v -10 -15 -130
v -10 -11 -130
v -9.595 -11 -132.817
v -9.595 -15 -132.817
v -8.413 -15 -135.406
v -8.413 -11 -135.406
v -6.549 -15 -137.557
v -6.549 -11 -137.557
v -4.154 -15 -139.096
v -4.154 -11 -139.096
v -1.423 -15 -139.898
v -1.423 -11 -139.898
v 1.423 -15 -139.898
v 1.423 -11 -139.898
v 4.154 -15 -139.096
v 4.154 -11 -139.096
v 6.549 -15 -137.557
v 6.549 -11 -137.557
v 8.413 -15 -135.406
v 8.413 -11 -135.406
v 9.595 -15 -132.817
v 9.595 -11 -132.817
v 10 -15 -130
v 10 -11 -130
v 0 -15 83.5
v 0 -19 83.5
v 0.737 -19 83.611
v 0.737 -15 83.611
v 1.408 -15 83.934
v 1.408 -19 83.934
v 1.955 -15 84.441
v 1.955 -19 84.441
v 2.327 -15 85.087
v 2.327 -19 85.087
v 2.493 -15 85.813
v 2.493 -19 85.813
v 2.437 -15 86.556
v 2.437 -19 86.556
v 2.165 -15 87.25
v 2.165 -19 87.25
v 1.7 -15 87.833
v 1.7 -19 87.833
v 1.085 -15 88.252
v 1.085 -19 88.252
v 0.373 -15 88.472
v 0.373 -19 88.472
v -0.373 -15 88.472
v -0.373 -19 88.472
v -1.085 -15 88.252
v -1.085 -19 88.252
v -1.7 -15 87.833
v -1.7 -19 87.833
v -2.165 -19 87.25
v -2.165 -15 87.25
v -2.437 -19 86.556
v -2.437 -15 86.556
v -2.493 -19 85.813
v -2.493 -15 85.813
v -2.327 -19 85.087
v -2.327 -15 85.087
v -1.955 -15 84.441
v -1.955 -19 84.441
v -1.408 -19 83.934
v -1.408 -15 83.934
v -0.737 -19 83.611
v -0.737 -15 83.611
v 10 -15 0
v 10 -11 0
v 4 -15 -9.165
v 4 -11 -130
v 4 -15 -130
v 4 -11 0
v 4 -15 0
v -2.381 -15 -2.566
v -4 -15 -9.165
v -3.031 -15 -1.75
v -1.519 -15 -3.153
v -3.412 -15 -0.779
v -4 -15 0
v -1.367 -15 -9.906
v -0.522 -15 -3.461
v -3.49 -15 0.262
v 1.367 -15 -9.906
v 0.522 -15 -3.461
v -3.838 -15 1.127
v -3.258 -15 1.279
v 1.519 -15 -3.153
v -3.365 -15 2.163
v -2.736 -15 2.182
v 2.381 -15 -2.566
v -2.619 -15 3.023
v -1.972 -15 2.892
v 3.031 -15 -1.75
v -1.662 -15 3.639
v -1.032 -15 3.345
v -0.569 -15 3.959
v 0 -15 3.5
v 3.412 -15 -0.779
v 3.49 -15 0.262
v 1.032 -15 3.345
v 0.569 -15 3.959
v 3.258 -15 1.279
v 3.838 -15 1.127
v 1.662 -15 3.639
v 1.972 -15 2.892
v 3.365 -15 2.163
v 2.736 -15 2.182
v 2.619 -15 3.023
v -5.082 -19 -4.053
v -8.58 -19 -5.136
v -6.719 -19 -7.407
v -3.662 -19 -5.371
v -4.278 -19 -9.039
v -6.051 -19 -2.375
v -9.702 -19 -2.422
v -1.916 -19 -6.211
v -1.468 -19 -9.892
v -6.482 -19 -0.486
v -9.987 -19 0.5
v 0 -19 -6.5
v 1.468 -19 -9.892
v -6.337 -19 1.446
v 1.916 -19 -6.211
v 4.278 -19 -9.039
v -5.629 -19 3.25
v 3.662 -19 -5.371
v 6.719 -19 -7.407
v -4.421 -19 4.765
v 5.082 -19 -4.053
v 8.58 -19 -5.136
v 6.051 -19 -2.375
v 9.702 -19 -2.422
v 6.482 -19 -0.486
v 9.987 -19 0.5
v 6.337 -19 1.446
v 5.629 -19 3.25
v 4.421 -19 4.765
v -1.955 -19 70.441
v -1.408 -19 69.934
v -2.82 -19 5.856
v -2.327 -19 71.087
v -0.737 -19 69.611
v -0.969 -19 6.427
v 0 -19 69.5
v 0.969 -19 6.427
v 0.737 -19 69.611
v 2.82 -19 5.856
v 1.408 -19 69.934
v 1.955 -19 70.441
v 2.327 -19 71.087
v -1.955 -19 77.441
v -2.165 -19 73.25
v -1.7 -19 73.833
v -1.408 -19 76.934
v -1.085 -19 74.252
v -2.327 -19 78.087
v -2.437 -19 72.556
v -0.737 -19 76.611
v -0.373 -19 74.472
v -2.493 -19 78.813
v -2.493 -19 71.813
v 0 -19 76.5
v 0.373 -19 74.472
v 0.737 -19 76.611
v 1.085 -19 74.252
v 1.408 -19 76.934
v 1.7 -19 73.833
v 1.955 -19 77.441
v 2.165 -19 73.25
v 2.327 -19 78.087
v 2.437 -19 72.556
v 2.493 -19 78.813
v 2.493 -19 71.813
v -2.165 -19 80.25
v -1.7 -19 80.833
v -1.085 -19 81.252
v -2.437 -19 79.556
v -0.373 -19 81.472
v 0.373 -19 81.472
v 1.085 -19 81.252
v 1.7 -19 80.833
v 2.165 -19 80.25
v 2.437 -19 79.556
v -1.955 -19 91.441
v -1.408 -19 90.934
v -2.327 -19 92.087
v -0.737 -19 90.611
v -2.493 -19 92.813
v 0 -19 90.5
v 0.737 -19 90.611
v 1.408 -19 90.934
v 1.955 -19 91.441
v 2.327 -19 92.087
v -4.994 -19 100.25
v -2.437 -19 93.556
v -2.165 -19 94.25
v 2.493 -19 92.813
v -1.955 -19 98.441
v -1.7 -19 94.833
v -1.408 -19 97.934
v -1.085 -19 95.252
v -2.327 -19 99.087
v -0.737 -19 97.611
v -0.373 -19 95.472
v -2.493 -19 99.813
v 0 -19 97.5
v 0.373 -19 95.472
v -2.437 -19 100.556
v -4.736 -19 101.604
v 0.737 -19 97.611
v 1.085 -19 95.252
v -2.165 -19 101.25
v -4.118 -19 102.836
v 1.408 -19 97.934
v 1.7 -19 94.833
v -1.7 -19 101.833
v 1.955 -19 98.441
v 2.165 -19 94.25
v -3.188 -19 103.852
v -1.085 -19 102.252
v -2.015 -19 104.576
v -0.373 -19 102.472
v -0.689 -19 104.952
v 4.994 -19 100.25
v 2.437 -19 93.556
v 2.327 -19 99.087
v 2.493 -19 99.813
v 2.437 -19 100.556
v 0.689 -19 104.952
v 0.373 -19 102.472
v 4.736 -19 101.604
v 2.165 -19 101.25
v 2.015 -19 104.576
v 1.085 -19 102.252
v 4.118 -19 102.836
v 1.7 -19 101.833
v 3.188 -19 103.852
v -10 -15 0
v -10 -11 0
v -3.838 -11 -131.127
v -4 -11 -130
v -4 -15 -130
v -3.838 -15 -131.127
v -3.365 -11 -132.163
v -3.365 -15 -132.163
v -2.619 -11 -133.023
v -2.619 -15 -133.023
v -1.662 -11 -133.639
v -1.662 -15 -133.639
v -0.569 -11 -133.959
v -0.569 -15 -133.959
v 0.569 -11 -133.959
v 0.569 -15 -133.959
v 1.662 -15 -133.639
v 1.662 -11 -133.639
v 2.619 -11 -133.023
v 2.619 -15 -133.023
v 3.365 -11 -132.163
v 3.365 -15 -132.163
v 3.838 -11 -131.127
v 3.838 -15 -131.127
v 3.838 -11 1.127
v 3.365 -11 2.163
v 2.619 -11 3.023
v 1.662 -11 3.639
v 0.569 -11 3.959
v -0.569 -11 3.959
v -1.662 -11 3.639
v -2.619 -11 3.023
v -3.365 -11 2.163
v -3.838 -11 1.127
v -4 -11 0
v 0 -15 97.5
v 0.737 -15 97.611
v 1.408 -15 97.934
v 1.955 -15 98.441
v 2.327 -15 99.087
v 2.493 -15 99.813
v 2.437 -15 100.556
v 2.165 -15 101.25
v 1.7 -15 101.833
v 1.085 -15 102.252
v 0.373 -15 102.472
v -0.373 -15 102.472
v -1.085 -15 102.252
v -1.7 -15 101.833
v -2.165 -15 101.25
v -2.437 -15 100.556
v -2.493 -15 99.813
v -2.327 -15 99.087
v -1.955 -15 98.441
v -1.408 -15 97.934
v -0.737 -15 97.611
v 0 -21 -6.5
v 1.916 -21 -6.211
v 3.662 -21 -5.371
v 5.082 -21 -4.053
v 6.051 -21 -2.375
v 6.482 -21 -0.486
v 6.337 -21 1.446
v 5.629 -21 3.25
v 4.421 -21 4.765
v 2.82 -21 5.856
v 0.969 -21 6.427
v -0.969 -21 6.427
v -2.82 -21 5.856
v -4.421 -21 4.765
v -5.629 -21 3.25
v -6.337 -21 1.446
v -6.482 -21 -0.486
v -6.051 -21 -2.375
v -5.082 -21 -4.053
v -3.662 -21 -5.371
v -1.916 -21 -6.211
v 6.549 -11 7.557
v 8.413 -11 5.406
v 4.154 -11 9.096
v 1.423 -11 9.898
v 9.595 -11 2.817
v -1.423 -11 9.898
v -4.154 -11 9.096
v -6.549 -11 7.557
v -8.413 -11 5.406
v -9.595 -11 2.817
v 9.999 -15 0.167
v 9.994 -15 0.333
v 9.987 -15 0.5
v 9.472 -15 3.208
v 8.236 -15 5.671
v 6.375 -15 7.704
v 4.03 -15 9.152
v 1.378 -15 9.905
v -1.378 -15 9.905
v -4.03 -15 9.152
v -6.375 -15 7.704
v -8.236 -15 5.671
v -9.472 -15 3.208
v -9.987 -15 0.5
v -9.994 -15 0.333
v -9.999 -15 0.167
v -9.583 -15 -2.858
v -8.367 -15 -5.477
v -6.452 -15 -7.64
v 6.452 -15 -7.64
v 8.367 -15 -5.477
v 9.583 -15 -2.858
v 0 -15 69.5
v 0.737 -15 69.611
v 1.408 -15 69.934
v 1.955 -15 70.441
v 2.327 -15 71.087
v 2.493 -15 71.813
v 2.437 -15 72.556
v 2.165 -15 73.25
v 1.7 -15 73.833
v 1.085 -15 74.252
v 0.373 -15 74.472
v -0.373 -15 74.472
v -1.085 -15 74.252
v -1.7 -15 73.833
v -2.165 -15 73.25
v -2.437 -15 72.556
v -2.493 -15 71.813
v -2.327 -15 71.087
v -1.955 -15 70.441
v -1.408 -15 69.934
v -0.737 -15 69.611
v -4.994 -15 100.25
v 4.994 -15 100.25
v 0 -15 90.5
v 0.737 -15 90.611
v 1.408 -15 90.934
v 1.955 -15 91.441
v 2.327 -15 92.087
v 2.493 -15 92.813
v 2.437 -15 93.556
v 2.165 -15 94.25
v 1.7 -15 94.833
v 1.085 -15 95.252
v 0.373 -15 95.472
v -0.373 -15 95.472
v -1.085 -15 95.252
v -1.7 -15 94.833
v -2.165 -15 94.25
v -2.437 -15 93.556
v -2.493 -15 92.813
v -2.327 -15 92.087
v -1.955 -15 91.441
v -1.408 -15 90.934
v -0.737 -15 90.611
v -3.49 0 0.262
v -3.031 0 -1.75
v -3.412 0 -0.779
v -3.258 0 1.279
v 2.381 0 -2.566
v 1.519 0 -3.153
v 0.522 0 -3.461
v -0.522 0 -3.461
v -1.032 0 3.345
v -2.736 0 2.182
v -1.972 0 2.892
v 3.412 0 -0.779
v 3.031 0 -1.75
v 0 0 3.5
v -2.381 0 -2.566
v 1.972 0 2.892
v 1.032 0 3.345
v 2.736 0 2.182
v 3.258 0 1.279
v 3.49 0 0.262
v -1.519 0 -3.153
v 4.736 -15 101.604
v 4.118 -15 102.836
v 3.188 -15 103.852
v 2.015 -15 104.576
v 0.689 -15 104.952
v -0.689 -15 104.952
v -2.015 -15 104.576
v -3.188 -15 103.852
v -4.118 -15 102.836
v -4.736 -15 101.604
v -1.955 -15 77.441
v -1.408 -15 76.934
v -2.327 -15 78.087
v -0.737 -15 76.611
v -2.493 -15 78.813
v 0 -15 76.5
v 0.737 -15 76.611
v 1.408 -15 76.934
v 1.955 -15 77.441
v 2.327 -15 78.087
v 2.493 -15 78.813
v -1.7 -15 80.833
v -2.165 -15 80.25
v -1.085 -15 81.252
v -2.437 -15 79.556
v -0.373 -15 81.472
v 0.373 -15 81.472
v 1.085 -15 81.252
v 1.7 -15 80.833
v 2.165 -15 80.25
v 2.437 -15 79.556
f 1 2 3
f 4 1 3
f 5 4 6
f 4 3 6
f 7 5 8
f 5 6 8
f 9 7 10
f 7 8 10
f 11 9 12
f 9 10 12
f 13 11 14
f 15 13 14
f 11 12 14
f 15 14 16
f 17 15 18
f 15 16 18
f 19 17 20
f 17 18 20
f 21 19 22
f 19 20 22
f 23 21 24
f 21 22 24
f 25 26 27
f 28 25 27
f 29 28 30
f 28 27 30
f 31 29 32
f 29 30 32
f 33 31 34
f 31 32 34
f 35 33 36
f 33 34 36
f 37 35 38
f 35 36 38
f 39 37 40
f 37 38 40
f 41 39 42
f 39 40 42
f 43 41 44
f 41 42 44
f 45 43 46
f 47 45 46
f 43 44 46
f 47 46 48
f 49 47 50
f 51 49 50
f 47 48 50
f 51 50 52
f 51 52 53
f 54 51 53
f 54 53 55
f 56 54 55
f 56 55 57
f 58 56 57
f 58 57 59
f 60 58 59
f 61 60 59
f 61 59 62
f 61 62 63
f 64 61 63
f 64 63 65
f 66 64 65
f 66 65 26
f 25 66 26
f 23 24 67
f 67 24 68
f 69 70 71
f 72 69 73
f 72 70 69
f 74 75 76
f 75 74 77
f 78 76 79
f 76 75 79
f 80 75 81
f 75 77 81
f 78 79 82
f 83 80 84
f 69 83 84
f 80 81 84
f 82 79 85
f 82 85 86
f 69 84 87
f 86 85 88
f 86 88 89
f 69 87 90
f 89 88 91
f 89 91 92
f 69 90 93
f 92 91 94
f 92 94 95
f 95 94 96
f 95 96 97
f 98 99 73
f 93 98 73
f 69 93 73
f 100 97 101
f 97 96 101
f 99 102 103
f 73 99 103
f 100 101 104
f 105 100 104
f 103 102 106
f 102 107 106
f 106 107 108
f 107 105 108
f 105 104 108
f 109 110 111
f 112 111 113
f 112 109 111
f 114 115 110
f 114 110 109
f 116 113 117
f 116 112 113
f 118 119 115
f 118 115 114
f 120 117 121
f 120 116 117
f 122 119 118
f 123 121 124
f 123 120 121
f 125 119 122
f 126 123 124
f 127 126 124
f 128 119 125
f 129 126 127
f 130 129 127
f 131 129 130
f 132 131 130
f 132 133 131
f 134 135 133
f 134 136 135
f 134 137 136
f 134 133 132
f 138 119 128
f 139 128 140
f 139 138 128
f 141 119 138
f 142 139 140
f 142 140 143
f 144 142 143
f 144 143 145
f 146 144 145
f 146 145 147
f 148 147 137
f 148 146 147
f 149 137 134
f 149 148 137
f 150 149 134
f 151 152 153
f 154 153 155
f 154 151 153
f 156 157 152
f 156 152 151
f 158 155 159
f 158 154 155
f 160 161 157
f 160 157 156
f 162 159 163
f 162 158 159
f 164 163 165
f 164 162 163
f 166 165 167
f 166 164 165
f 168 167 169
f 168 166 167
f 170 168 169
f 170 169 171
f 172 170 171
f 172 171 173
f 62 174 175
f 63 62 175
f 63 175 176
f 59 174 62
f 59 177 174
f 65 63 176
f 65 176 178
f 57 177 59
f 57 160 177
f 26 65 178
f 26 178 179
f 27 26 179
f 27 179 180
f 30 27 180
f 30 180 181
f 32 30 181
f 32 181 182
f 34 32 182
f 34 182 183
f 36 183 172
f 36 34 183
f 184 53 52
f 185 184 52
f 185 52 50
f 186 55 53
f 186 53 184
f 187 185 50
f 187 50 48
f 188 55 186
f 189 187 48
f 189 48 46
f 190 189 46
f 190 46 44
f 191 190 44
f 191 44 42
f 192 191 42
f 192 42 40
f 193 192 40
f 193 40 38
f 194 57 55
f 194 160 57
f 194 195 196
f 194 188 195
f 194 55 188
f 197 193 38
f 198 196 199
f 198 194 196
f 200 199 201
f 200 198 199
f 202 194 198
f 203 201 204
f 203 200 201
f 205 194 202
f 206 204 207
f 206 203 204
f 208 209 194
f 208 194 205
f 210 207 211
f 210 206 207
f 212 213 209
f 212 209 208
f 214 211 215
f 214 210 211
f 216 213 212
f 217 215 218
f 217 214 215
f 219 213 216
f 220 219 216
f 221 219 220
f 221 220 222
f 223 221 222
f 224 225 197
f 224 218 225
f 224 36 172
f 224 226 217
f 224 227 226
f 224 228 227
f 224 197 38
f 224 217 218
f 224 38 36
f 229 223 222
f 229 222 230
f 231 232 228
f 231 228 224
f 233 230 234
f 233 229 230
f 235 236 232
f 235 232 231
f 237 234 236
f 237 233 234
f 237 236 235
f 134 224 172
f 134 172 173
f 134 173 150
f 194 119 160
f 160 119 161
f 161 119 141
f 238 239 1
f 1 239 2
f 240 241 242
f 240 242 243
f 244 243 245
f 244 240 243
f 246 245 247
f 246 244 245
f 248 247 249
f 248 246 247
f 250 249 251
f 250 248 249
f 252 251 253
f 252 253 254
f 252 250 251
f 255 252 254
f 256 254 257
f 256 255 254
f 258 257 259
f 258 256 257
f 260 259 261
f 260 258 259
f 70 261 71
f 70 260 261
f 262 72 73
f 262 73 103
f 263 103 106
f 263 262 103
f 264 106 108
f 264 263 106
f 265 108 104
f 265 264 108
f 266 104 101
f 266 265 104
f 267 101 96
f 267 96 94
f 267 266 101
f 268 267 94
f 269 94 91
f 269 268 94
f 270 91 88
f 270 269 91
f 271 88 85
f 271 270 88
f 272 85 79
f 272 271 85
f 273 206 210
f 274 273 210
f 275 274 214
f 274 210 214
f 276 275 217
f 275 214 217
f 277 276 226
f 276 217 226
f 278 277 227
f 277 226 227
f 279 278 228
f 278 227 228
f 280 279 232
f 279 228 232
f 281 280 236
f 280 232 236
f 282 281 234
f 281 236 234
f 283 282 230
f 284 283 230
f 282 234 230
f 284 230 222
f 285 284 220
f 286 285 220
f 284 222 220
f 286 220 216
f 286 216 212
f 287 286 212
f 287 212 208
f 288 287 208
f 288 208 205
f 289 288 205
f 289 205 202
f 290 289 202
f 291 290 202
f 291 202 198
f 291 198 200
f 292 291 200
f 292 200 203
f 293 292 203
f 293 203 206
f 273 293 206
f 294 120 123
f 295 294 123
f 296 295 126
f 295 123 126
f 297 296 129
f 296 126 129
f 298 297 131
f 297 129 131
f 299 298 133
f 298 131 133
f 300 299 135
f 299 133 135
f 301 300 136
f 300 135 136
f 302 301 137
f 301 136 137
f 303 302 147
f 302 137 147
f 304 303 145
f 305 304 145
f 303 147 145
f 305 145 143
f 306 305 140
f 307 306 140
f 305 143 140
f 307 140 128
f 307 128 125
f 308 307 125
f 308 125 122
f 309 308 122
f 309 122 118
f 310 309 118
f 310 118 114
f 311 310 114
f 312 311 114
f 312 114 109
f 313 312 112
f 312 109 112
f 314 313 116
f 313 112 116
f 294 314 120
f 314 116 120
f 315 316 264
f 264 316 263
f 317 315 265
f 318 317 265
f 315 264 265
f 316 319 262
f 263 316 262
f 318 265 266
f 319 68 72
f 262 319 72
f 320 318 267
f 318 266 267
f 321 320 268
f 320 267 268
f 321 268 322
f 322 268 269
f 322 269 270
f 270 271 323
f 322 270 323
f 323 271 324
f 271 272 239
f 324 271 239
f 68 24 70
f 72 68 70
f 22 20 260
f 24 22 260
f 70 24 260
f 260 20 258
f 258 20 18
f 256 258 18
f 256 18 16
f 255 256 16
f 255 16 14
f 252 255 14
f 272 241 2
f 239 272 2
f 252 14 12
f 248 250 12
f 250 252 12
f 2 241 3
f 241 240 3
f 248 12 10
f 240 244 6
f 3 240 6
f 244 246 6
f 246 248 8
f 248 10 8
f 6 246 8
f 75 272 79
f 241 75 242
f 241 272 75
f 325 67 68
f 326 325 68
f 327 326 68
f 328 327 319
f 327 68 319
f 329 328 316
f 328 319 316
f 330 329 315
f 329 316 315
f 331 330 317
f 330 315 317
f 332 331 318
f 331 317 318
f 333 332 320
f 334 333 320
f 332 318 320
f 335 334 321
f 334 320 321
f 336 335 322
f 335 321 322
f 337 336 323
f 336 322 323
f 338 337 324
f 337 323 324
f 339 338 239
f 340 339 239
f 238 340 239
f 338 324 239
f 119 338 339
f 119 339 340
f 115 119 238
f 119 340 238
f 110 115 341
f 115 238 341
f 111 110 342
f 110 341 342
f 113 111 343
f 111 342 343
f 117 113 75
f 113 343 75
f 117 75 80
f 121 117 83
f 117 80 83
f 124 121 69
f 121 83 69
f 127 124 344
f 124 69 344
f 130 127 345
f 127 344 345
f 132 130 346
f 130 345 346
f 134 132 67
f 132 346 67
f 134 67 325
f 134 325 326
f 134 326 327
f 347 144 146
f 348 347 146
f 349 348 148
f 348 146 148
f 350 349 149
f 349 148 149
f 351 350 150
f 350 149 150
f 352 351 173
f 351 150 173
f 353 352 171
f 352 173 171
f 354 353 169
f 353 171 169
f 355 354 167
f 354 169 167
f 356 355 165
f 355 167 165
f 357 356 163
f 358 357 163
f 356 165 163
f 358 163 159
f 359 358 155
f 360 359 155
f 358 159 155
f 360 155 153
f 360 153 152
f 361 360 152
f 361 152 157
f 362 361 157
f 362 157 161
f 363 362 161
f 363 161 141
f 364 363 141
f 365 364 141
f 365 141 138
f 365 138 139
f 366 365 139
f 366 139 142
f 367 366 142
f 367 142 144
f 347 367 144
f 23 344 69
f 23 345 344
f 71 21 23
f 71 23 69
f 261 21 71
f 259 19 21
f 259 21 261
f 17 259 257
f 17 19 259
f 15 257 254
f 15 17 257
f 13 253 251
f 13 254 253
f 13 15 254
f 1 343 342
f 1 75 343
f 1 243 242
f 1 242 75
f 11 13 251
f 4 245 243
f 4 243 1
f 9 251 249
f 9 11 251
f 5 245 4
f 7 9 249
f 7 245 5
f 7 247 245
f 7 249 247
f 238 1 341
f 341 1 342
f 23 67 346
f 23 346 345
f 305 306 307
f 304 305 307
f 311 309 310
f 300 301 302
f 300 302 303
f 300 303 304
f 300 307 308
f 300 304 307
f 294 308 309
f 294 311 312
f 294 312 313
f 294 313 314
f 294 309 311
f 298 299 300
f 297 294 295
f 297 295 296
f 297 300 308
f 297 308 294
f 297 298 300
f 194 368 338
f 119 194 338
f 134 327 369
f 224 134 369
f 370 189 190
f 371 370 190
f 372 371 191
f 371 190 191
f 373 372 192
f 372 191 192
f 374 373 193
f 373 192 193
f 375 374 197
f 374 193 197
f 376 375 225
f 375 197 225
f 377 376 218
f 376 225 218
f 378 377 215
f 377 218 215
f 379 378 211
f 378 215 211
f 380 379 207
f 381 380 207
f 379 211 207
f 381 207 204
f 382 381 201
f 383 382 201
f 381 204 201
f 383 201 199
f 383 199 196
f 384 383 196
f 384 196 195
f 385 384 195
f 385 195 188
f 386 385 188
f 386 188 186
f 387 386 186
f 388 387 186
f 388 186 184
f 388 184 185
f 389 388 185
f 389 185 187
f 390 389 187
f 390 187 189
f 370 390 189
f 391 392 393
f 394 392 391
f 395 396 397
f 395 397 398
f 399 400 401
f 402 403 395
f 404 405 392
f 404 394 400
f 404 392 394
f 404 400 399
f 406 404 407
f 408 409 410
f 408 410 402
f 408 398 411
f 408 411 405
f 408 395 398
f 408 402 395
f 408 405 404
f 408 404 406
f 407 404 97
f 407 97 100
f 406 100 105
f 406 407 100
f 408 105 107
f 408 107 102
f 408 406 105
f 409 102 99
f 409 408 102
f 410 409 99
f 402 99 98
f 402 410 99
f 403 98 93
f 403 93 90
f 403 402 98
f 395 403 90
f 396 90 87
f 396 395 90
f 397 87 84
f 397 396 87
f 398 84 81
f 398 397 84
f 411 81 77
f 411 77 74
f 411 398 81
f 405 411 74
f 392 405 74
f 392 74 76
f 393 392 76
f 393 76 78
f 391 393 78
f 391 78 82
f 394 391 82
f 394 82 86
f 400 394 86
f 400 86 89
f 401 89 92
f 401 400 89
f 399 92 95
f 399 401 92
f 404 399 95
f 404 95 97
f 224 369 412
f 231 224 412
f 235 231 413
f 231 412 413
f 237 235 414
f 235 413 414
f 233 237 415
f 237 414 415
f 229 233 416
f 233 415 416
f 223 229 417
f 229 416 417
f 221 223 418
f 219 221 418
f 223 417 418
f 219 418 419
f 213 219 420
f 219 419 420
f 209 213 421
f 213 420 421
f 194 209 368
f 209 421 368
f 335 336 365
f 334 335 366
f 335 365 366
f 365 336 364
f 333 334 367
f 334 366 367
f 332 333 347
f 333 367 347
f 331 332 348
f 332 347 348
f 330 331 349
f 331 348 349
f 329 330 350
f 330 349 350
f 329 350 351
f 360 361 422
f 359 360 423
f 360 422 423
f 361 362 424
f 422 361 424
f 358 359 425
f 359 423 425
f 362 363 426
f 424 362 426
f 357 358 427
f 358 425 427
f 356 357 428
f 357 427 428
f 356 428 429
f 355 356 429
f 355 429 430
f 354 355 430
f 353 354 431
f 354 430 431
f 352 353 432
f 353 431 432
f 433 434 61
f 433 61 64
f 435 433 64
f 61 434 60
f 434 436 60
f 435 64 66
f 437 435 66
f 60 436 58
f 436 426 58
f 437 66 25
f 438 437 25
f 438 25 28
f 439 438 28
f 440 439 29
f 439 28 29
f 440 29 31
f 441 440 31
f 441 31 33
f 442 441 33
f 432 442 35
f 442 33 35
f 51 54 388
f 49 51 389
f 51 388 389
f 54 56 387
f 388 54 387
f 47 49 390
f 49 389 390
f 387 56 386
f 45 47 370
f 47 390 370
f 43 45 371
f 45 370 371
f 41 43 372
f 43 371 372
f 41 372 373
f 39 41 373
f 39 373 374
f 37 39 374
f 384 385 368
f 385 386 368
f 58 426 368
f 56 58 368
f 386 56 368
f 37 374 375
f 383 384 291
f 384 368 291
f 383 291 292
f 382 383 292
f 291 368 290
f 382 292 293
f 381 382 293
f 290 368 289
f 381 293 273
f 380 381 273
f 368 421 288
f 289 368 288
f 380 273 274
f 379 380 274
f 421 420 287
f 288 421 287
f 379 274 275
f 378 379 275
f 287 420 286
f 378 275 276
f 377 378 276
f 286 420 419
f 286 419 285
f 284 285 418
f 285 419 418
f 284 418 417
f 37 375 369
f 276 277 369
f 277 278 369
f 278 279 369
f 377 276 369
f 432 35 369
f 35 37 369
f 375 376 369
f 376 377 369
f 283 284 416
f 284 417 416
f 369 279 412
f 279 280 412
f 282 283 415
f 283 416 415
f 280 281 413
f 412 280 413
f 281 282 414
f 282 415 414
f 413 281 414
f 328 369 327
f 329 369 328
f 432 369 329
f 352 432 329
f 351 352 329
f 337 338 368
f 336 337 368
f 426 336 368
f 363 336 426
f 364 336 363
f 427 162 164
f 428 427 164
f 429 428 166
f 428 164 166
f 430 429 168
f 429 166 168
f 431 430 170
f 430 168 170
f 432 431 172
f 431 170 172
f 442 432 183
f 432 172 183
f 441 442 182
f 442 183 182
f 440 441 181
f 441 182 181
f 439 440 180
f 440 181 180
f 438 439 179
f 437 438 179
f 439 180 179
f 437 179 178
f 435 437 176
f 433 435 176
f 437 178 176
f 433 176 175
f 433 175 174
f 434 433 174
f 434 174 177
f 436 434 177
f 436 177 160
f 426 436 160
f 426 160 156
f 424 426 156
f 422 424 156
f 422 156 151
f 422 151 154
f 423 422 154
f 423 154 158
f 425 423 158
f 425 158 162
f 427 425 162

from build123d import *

# Parameters (mm, degrees)
SKETCH1_R           = 3.5
BOSS_EXTRUDE1_DEPTH = 15
BOSS_EXTRUDE2_DEPTH = 4
SKETCH3_R           = 2.5
CUT_EXTRUDE1_DEPTH  = 108.172757733
LPATTERN1_COUNT     = 5
LPATTERN1_PITCH     = 7
BOSS_EXTRUDE3_START = 4
BOSS_EXTRUDE3_DEPTH = 4
SKETCH5_R           = 6.5
BOSS_EXTRUDE4_DEPTH = 2


with BuildPart() as part:
    # Sketch1 → Boss-Extrude1 (new body)
    with BuildSketch(Plane(origin=(0, 0, 0), x_dir=(1, 0, 0), z_dir=(0, 1, 0))):
        with Locations(Location((0, 0, 0), (0, 0, 270))):
            Circle(SKETCH1_R)
    extrude(amount=-BOSS_EXTRUDE1_DEPTH)

    # Sketch2 → Boss-Extrude2 (add)
    with BuildSketch(Plane.XZ.offset(15)):
        with BuildLine():
            Line((9.987492178, 0.5), (4.993746089, 100.25))
            ThreePointArc((4.993746089, 100.25), (0, 105), (-4.993746089, 100.25))
            Line((-4.993746089, 100.25), (-9.987492178, 0.5))
            ThreePointArc((-9.987492178, 0.5), (0, -10), (9.987492178, 0.5))
        make_face()
    extrude(amount=BOSS_EXTRUDE2_DEPTH)

    # Sketch3 → Cut-Extrude1 (cut, through all)
    with BuildSketch(Plane.XZ.offset(19)):
        with Locations(Location((0, 100, 0), (0, 0, 270))):
            Circle(SKETCH3_R)
    cut_extrude1 = extrude(amount=-CUT_EXTRUDE1_DEPTH, mode=Mode.SUBTRACT)

    # LPattern1: Cut-Extrude1 ×5
    with Locations(*[(0, 0, -i * LPATTERN1_PITCH) for i in range(1, LPATTERN1_COUNT)]):
        add(cut_extrude1, mode=Mode.SUBTRACT)

    # Sketch4 → Boss-Extrude3 (add)
    with BuildSketch(Plane(origin=(0, -15, 0), x_dir=(1, 0, 0), z_dir=(0, 1, 0)).offset(BOSS_EXTRUDE3_START)):
        with BuildLine():
            Line((-10, 0), (-10, 130))
            ThreePointArc((-10, 130), (0, 140), (10, 130))
            Line((10, 130), (10, 0))
            ThreePointArc((10, 0), (0, -10), (-10, 0))
        make_face()
        with BuildLine():
            Line((-4, 0), (-4, 130))
            ThreePointArc((-4, 130), (0, 134), (4, 130))
            Line((4, 130), (4, 0))
            ThreePointArc((4, 0), (0, -4), (-4, 0))
        make_face(mode=Mode.SUBTRACT)
    extrude(amount=-BOSS_EXTRUDE3_DEPTH)

    # Sketch5 → Boss-Extrude4 (add)
    with BuildSketch(Plane.XZ.offset(19)):
        with Locations(Location((0, 0, 0), (0, 0, 270))):
            Circle(SKETCH5_R)
    extrude(amount=BOSS_EXTRUDE4_DEPTH)


solid = part.part
